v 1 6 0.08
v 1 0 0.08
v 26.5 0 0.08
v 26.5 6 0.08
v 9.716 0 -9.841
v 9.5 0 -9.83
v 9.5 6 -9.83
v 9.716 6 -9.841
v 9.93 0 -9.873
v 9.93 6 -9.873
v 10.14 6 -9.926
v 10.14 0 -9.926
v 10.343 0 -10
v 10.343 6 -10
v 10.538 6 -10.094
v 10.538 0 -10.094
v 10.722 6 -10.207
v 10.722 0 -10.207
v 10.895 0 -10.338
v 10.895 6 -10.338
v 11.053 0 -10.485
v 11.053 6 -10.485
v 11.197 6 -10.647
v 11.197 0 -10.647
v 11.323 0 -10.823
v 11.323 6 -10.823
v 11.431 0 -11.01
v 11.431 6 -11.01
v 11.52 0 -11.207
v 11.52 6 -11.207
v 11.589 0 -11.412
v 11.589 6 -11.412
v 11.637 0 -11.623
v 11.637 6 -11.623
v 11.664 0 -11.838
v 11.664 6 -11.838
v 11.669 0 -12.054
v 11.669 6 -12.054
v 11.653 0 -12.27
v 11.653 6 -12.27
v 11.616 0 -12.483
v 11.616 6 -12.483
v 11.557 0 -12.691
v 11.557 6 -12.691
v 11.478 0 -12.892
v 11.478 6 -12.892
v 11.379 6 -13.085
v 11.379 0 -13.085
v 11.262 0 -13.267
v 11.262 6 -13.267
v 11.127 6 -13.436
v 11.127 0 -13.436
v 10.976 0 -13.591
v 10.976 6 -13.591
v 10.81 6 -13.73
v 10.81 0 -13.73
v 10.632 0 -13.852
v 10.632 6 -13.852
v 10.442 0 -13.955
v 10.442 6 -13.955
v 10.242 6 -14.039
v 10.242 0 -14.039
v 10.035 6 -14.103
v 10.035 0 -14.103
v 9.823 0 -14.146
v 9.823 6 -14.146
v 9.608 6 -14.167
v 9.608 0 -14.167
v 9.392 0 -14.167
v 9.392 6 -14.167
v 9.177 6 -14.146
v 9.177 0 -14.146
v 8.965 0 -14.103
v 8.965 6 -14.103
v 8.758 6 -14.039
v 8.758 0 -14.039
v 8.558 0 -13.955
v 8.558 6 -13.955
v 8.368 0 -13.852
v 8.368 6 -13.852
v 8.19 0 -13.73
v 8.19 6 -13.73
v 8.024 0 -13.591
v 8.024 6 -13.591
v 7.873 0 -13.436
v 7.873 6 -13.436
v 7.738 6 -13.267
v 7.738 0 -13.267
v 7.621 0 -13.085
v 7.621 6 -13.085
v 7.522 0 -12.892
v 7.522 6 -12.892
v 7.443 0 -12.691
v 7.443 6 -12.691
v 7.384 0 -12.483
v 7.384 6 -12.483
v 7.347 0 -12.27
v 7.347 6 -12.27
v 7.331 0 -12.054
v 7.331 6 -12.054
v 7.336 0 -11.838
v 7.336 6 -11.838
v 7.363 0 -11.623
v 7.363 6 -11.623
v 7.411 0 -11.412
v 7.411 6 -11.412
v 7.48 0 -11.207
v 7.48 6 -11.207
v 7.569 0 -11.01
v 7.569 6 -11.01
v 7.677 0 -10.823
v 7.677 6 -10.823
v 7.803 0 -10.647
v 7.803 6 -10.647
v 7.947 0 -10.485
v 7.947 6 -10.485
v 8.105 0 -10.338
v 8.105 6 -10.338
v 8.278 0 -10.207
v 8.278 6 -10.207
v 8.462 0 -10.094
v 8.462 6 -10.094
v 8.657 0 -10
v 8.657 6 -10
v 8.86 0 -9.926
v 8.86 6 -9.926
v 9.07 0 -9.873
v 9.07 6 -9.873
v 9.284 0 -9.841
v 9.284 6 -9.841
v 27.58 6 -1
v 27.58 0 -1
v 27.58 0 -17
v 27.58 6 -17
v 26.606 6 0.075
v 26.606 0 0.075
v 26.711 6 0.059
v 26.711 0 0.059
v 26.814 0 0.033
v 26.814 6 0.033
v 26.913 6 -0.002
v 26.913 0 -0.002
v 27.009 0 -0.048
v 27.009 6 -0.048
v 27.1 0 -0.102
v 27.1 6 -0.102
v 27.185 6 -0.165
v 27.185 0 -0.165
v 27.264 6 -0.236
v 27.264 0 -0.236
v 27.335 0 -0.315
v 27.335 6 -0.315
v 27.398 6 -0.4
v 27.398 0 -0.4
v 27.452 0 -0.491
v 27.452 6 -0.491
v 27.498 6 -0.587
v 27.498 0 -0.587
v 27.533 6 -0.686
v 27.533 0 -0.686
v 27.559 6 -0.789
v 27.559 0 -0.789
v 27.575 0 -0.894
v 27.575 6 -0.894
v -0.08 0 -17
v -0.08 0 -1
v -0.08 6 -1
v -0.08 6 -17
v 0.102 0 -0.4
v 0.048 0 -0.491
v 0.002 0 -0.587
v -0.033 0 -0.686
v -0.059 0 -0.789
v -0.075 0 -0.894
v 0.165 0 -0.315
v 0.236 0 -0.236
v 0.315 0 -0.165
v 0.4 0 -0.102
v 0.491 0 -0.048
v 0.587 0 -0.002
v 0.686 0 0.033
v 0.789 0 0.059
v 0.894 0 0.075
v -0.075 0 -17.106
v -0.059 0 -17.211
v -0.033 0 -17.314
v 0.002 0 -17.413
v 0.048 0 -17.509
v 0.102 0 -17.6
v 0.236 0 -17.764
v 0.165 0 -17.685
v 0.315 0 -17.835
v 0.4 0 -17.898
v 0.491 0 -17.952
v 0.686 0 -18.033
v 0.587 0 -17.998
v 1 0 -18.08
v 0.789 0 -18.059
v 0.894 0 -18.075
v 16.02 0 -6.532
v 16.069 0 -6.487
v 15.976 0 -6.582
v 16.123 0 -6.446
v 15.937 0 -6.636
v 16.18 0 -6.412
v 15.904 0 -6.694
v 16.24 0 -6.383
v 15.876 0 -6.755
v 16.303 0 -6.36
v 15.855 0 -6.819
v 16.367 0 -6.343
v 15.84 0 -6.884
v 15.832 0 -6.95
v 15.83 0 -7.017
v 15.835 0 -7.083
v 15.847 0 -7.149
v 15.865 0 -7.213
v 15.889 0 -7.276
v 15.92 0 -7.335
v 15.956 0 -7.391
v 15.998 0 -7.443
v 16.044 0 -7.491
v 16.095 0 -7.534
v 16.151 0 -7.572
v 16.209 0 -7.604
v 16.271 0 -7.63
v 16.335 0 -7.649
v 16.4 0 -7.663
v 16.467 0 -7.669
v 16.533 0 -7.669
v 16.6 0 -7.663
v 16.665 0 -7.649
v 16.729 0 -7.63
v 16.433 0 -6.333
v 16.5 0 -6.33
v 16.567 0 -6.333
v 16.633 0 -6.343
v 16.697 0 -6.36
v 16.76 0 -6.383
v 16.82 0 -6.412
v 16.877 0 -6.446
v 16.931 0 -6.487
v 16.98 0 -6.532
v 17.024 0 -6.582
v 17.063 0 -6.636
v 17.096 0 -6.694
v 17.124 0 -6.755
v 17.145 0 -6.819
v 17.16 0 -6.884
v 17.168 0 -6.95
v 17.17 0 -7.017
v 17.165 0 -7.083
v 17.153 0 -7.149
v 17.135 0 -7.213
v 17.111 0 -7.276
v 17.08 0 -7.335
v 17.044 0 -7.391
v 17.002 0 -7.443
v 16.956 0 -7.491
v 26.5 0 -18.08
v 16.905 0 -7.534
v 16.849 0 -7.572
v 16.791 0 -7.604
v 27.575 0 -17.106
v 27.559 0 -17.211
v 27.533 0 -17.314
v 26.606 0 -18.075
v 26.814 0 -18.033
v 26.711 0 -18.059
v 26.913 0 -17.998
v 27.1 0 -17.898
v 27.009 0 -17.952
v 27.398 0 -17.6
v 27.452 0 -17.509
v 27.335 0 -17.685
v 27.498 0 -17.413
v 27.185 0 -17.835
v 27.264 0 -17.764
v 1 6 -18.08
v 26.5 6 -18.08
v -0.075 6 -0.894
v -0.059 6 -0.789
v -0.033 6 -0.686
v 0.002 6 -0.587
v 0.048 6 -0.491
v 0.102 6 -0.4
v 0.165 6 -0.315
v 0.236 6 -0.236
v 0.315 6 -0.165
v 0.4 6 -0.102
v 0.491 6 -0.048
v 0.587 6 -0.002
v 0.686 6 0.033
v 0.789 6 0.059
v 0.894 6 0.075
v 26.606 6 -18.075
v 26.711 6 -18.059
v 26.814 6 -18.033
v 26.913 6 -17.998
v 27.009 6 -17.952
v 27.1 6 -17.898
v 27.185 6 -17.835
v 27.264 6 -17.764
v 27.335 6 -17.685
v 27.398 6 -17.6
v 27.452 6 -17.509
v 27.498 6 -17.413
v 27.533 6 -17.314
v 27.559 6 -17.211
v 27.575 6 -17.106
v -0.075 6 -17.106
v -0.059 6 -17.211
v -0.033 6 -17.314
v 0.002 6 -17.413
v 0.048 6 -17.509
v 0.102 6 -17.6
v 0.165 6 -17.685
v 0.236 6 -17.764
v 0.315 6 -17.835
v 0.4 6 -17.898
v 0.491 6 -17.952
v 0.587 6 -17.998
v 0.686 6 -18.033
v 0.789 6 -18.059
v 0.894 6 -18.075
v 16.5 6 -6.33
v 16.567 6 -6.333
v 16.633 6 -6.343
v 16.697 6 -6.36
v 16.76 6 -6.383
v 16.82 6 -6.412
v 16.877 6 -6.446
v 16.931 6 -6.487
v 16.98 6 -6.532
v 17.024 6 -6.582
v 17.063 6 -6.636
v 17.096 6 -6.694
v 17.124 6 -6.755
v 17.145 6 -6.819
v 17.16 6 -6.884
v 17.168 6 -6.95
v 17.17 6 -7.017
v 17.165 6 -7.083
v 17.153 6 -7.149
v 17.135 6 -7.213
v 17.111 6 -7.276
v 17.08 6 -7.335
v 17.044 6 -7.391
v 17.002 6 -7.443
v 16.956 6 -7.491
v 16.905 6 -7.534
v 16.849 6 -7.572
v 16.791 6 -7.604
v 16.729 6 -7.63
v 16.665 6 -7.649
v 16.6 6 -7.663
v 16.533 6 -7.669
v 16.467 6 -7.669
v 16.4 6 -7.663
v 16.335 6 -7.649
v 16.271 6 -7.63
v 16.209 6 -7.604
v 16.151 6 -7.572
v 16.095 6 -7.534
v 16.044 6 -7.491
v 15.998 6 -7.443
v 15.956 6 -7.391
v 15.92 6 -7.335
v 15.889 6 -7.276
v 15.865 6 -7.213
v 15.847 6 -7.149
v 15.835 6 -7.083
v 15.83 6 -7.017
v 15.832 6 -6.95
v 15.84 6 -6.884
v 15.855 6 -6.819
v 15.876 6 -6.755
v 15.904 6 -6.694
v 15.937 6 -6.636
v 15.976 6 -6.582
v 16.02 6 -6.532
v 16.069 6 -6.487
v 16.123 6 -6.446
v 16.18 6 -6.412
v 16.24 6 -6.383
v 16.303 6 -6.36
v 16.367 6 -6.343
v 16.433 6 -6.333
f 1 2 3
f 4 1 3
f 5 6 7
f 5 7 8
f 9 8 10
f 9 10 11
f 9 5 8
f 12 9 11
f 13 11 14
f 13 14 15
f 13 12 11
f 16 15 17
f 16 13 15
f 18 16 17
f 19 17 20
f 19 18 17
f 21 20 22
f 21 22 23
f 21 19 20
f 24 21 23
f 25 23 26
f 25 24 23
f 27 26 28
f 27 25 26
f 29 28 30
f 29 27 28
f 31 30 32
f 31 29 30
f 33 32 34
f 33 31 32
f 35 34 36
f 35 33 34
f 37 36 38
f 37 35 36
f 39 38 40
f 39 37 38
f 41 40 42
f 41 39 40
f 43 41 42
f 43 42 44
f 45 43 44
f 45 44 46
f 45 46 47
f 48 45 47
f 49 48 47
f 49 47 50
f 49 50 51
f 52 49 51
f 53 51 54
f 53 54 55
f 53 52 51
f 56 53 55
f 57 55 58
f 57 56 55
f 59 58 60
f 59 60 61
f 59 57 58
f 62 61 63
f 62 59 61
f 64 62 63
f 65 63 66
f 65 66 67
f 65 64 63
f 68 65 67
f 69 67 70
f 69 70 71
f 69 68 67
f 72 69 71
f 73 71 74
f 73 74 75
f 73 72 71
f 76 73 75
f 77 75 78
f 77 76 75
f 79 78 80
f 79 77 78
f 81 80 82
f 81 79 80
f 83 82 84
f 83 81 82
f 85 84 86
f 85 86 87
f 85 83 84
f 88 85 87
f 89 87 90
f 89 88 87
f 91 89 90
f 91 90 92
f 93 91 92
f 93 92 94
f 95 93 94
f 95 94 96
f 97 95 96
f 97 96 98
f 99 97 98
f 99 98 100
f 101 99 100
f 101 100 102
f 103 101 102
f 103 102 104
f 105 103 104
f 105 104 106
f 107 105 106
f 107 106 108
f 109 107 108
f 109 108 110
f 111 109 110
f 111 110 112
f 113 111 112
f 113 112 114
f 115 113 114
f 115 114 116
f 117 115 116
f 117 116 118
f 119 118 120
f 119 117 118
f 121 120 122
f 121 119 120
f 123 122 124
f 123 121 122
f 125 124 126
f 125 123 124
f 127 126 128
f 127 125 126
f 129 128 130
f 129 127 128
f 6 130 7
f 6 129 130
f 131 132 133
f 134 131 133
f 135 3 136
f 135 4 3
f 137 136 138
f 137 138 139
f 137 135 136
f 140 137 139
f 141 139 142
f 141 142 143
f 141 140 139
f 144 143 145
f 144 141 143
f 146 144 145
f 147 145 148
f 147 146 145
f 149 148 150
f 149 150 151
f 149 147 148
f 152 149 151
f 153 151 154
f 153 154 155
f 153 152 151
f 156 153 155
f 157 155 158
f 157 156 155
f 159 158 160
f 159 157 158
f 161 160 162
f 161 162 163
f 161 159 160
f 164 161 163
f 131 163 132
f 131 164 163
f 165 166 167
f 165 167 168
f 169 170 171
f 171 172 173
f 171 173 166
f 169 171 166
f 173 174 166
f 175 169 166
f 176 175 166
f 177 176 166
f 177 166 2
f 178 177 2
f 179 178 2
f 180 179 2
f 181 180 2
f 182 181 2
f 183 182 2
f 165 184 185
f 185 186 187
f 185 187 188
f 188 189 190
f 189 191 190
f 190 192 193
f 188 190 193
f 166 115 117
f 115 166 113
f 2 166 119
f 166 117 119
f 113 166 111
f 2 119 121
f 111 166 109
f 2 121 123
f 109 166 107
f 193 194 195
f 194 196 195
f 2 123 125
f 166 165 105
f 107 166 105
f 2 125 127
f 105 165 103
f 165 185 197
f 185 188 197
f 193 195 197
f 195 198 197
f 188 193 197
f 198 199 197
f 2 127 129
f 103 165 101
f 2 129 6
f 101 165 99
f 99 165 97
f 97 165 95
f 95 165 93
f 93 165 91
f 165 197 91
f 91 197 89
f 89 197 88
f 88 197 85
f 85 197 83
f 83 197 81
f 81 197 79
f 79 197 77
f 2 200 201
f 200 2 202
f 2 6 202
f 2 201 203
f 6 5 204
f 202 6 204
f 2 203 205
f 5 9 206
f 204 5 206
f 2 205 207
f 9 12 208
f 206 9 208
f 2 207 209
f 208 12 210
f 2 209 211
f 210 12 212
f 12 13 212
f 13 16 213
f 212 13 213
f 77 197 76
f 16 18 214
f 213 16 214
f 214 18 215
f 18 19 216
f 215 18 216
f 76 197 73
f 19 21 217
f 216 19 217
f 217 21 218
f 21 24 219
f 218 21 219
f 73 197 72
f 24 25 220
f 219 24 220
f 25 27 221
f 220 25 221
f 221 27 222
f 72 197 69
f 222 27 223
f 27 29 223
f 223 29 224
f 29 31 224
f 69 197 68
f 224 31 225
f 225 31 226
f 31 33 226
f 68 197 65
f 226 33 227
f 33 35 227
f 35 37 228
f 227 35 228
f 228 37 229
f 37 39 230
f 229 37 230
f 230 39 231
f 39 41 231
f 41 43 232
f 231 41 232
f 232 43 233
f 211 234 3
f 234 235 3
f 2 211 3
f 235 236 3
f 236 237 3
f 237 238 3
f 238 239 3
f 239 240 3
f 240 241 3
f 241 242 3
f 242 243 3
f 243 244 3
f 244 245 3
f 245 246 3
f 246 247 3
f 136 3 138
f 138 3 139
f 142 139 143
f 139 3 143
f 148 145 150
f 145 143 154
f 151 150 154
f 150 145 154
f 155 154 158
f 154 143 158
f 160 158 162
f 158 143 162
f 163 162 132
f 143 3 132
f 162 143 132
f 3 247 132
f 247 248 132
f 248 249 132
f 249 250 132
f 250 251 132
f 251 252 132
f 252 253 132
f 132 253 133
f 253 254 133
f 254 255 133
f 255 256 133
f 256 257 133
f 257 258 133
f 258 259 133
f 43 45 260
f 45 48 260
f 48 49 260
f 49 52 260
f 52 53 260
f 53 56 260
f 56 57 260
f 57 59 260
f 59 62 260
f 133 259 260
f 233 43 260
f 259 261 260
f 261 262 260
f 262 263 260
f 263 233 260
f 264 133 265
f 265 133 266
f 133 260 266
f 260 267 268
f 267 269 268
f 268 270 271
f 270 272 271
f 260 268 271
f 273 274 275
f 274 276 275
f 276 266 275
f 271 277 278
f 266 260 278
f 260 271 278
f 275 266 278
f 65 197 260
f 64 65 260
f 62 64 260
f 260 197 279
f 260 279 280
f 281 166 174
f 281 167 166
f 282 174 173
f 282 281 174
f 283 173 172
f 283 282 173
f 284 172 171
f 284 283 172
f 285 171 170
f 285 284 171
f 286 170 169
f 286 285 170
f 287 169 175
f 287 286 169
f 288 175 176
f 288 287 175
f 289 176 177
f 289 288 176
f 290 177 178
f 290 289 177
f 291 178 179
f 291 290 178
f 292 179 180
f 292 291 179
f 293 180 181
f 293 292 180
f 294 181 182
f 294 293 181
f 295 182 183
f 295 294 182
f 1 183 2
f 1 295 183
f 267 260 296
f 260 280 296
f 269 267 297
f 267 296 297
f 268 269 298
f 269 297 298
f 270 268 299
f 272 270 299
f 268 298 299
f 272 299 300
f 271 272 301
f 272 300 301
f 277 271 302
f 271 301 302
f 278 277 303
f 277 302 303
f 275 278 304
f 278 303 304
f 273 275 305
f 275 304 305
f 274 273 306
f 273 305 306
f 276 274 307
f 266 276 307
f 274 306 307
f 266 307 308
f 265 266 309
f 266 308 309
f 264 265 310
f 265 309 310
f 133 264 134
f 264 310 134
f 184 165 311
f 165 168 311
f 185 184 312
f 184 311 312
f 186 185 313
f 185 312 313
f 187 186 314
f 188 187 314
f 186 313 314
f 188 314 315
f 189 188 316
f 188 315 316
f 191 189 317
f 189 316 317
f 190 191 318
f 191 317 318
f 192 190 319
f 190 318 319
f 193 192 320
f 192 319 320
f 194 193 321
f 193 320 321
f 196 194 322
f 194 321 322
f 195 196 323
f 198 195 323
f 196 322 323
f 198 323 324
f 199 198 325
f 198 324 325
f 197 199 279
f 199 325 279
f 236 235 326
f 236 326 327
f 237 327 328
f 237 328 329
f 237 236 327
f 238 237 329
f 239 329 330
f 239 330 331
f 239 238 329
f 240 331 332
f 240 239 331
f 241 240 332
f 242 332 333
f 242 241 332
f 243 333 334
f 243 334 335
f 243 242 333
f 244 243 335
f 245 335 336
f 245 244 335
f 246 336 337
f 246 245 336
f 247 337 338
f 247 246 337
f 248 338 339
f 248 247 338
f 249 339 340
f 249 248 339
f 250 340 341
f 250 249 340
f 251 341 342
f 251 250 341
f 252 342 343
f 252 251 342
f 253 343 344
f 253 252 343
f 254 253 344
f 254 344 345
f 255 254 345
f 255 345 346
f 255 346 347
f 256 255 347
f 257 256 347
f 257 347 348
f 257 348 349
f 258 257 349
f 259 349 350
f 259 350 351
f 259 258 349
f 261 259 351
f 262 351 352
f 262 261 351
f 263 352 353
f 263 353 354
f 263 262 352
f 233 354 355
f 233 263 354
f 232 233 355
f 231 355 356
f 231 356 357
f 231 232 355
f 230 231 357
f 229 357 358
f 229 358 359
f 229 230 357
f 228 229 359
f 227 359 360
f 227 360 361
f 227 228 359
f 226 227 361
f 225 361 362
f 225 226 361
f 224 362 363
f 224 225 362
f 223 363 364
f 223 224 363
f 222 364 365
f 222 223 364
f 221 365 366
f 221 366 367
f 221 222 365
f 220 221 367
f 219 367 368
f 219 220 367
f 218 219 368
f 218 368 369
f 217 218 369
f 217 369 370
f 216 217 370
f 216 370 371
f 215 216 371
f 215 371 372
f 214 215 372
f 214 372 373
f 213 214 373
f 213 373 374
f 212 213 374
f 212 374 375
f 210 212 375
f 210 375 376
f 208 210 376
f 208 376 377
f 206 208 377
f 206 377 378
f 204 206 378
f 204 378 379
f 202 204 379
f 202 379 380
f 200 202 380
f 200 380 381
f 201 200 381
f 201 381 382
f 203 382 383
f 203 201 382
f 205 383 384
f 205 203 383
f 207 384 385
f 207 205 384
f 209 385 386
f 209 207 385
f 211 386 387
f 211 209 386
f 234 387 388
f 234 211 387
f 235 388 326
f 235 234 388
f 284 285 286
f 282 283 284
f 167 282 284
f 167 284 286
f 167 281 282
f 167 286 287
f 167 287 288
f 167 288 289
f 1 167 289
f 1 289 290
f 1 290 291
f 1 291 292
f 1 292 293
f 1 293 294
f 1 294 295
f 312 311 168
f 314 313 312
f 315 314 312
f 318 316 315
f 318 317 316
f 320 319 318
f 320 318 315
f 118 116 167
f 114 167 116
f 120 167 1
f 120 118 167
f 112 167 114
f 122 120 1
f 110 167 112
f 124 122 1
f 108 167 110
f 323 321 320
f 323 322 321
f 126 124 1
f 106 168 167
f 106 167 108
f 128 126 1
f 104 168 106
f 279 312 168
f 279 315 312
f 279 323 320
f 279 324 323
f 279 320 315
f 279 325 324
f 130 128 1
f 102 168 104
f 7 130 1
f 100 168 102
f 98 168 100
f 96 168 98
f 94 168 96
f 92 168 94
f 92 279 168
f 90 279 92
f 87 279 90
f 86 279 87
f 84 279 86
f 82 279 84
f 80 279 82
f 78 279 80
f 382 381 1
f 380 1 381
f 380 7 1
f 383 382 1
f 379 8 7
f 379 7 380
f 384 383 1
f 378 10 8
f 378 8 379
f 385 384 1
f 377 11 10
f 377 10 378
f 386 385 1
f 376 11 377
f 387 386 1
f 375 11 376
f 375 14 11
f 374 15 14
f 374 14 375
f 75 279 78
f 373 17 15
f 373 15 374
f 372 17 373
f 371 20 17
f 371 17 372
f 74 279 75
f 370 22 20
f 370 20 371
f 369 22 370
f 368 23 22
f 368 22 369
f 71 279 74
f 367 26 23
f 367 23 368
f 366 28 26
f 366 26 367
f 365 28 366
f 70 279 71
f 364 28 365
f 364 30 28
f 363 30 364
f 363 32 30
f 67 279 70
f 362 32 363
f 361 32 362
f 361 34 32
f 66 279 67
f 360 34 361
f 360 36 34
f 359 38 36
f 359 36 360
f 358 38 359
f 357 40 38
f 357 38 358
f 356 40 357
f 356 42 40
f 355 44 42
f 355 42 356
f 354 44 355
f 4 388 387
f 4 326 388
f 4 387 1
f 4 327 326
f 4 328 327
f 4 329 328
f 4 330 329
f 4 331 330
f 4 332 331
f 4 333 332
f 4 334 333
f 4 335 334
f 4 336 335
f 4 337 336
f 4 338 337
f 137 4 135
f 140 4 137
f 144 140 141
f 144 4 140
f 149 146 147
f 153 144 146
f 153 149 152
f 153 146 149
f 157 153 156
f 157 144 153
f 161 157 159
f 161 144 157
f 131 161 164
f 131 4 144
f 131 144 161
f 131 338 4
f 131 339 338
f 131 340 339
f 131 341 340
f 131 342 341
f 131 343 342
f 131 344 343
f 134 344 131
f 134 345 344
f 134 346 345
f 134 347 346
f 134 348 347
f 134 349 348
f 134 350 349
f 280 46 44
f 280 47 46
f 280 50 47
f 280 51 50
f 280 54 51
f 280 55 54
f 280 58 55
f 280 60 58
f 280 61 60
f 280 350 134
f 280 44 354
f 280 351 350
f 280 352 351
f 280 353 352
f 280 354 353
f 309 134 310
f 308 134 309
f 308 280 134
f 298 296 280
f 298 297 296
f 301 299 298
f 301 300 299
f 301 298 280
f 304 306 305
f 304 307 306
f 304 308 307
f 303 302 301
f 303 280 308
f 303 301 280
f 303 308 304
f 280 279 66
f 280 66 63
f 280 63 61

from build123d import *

# Parameters (mm, degrees)
SKETCH1_W           = 27.5
SKETCH1_H           = 18
SKETCH1_R           = 2.25
SKETCH1_R_2         = 0.75
BOSS_EXTRUDE1_DEPTH = 6
FILLET1_R           = 1
MOVE_FACE1_BY       = 0.08
MOVE_FACE1_2_BY     = 0.08
MOVE_FACE1_3_BY     = 0.08
MOVE_FACE1_4_BY     = 0.08
MOVE_FACE1_5_BY     = 0.08
MOVE_FACE1_6_BY     = 0.08
MOVE_FACE1_7_BY     = 0.08
MOVE_FACE1_8_BY     = 0.08
MOVE_FACE1_9_BY     = 0.08
MOVE_FACE1_10_BY    = 0.08


with BuildPart() as part:
    # Sketch1 → Boss-Extrude1 (new body)
    with BuildSketch(Plane(origin=(0, 0, 0), x_dir=(1, 0, 0), z_dir=(0, 1, 0))):
        with Locations((13.75, 9)):
            Rectangle(SKETCH1_W, SKETCH1_H)
        with Locations(Location((9.5, 12, 0), (0, 0, 270))):
            Circle(SKETCH1_R, mode=Mode.SUBTRACT)
        with Locations(Location((16.5, 7, 0), (0, 0, 270))):
            Circle(SKETCH1_R_2, mode=Mode.SUBTRACT)
    extrude(amount=BOSS_EXTRUDE1_DEPTH)

    # Fillet1
    fillet1_edges = [part.edges().sort_by_distance(p)[0] for p in [
        (0, 3, -18),
        (27.5, 3, -18),
        (27.5, 3, 0),
        (0, 3, 0),
    ]]
    fillet(fillet1_edges, radius=FILLET1_R)

    # Move Face1: a curved face moved outward by 0.08
    add(Solid.thicken(part.faces().sort_by_distance((16.5, 3, -7.75))[0], MOVE_FACE1_BY))

    # Move Face1 2: a curved face moved outward by 0.08
    add(Solid.thicken(part.faces().sort_by_distance((9.5, 3, -14.25))[0], MOVE_FACE1_2_BY))

    # Move Face1 3: a curved face moved outward by 0.08
    add(Solid.thicken(part.faces().sort_by_distance((0.292893219, 3, -0.292893219))[0], MOVE_FACE1_3_BY))

    # Move Face1 4: a face moved outward by 0.08
    extrude(part.faces().sort_by_distance((0, 3, -9))[0], amount=MOVE_FACE1_4_BY, dir=(-1, 0, 0))

    # Move Face1 5: a curved face moved outward by 0.08
    add(Solid.thicken(part.faces().sort_by_distance((0.292893219, 3, -17.707106781))[0], MOVE_FACE1_5_BY))

    # Move Face1 6: a face moved outward by 0.08
    extrude(part.faces().sort_by_distance((13.75, 3, -18))[0], amount=MOVE_FACE1_6_BY, dir=(0, 0, -1))

    # Move Face1 7: a curved face moved outward by 0.08
    add(Solid.thicken(part.faces().sort_by_distance((27.207106781, 3, -17.707106781))[0], MOVE_FACE1_7_BY))

    # Move Face1 8: a face moved outward by 0.08
    extrude(part.faces().sort_by_distance((27.5, 3, -9))[0], amount=MOVE_FACE1_8_BY, dir=(1, 0, 0))

    # Move Face1 9: a curved face moved outward by 0.08
    add(Solid.thicken(part.faces().sort_by_distance((27.207106781, 3, -0.292893219))[0], MOVE_FACE1_9_BY))

    # Move Face1 10: a face moved outward by 0.08
    extrude(part.faces().sort_by_distance((13.75, 3, 0))[0], amount=MOVE_FACE1_10_BY, dir=(0, 0, 1))


solid = part.part
